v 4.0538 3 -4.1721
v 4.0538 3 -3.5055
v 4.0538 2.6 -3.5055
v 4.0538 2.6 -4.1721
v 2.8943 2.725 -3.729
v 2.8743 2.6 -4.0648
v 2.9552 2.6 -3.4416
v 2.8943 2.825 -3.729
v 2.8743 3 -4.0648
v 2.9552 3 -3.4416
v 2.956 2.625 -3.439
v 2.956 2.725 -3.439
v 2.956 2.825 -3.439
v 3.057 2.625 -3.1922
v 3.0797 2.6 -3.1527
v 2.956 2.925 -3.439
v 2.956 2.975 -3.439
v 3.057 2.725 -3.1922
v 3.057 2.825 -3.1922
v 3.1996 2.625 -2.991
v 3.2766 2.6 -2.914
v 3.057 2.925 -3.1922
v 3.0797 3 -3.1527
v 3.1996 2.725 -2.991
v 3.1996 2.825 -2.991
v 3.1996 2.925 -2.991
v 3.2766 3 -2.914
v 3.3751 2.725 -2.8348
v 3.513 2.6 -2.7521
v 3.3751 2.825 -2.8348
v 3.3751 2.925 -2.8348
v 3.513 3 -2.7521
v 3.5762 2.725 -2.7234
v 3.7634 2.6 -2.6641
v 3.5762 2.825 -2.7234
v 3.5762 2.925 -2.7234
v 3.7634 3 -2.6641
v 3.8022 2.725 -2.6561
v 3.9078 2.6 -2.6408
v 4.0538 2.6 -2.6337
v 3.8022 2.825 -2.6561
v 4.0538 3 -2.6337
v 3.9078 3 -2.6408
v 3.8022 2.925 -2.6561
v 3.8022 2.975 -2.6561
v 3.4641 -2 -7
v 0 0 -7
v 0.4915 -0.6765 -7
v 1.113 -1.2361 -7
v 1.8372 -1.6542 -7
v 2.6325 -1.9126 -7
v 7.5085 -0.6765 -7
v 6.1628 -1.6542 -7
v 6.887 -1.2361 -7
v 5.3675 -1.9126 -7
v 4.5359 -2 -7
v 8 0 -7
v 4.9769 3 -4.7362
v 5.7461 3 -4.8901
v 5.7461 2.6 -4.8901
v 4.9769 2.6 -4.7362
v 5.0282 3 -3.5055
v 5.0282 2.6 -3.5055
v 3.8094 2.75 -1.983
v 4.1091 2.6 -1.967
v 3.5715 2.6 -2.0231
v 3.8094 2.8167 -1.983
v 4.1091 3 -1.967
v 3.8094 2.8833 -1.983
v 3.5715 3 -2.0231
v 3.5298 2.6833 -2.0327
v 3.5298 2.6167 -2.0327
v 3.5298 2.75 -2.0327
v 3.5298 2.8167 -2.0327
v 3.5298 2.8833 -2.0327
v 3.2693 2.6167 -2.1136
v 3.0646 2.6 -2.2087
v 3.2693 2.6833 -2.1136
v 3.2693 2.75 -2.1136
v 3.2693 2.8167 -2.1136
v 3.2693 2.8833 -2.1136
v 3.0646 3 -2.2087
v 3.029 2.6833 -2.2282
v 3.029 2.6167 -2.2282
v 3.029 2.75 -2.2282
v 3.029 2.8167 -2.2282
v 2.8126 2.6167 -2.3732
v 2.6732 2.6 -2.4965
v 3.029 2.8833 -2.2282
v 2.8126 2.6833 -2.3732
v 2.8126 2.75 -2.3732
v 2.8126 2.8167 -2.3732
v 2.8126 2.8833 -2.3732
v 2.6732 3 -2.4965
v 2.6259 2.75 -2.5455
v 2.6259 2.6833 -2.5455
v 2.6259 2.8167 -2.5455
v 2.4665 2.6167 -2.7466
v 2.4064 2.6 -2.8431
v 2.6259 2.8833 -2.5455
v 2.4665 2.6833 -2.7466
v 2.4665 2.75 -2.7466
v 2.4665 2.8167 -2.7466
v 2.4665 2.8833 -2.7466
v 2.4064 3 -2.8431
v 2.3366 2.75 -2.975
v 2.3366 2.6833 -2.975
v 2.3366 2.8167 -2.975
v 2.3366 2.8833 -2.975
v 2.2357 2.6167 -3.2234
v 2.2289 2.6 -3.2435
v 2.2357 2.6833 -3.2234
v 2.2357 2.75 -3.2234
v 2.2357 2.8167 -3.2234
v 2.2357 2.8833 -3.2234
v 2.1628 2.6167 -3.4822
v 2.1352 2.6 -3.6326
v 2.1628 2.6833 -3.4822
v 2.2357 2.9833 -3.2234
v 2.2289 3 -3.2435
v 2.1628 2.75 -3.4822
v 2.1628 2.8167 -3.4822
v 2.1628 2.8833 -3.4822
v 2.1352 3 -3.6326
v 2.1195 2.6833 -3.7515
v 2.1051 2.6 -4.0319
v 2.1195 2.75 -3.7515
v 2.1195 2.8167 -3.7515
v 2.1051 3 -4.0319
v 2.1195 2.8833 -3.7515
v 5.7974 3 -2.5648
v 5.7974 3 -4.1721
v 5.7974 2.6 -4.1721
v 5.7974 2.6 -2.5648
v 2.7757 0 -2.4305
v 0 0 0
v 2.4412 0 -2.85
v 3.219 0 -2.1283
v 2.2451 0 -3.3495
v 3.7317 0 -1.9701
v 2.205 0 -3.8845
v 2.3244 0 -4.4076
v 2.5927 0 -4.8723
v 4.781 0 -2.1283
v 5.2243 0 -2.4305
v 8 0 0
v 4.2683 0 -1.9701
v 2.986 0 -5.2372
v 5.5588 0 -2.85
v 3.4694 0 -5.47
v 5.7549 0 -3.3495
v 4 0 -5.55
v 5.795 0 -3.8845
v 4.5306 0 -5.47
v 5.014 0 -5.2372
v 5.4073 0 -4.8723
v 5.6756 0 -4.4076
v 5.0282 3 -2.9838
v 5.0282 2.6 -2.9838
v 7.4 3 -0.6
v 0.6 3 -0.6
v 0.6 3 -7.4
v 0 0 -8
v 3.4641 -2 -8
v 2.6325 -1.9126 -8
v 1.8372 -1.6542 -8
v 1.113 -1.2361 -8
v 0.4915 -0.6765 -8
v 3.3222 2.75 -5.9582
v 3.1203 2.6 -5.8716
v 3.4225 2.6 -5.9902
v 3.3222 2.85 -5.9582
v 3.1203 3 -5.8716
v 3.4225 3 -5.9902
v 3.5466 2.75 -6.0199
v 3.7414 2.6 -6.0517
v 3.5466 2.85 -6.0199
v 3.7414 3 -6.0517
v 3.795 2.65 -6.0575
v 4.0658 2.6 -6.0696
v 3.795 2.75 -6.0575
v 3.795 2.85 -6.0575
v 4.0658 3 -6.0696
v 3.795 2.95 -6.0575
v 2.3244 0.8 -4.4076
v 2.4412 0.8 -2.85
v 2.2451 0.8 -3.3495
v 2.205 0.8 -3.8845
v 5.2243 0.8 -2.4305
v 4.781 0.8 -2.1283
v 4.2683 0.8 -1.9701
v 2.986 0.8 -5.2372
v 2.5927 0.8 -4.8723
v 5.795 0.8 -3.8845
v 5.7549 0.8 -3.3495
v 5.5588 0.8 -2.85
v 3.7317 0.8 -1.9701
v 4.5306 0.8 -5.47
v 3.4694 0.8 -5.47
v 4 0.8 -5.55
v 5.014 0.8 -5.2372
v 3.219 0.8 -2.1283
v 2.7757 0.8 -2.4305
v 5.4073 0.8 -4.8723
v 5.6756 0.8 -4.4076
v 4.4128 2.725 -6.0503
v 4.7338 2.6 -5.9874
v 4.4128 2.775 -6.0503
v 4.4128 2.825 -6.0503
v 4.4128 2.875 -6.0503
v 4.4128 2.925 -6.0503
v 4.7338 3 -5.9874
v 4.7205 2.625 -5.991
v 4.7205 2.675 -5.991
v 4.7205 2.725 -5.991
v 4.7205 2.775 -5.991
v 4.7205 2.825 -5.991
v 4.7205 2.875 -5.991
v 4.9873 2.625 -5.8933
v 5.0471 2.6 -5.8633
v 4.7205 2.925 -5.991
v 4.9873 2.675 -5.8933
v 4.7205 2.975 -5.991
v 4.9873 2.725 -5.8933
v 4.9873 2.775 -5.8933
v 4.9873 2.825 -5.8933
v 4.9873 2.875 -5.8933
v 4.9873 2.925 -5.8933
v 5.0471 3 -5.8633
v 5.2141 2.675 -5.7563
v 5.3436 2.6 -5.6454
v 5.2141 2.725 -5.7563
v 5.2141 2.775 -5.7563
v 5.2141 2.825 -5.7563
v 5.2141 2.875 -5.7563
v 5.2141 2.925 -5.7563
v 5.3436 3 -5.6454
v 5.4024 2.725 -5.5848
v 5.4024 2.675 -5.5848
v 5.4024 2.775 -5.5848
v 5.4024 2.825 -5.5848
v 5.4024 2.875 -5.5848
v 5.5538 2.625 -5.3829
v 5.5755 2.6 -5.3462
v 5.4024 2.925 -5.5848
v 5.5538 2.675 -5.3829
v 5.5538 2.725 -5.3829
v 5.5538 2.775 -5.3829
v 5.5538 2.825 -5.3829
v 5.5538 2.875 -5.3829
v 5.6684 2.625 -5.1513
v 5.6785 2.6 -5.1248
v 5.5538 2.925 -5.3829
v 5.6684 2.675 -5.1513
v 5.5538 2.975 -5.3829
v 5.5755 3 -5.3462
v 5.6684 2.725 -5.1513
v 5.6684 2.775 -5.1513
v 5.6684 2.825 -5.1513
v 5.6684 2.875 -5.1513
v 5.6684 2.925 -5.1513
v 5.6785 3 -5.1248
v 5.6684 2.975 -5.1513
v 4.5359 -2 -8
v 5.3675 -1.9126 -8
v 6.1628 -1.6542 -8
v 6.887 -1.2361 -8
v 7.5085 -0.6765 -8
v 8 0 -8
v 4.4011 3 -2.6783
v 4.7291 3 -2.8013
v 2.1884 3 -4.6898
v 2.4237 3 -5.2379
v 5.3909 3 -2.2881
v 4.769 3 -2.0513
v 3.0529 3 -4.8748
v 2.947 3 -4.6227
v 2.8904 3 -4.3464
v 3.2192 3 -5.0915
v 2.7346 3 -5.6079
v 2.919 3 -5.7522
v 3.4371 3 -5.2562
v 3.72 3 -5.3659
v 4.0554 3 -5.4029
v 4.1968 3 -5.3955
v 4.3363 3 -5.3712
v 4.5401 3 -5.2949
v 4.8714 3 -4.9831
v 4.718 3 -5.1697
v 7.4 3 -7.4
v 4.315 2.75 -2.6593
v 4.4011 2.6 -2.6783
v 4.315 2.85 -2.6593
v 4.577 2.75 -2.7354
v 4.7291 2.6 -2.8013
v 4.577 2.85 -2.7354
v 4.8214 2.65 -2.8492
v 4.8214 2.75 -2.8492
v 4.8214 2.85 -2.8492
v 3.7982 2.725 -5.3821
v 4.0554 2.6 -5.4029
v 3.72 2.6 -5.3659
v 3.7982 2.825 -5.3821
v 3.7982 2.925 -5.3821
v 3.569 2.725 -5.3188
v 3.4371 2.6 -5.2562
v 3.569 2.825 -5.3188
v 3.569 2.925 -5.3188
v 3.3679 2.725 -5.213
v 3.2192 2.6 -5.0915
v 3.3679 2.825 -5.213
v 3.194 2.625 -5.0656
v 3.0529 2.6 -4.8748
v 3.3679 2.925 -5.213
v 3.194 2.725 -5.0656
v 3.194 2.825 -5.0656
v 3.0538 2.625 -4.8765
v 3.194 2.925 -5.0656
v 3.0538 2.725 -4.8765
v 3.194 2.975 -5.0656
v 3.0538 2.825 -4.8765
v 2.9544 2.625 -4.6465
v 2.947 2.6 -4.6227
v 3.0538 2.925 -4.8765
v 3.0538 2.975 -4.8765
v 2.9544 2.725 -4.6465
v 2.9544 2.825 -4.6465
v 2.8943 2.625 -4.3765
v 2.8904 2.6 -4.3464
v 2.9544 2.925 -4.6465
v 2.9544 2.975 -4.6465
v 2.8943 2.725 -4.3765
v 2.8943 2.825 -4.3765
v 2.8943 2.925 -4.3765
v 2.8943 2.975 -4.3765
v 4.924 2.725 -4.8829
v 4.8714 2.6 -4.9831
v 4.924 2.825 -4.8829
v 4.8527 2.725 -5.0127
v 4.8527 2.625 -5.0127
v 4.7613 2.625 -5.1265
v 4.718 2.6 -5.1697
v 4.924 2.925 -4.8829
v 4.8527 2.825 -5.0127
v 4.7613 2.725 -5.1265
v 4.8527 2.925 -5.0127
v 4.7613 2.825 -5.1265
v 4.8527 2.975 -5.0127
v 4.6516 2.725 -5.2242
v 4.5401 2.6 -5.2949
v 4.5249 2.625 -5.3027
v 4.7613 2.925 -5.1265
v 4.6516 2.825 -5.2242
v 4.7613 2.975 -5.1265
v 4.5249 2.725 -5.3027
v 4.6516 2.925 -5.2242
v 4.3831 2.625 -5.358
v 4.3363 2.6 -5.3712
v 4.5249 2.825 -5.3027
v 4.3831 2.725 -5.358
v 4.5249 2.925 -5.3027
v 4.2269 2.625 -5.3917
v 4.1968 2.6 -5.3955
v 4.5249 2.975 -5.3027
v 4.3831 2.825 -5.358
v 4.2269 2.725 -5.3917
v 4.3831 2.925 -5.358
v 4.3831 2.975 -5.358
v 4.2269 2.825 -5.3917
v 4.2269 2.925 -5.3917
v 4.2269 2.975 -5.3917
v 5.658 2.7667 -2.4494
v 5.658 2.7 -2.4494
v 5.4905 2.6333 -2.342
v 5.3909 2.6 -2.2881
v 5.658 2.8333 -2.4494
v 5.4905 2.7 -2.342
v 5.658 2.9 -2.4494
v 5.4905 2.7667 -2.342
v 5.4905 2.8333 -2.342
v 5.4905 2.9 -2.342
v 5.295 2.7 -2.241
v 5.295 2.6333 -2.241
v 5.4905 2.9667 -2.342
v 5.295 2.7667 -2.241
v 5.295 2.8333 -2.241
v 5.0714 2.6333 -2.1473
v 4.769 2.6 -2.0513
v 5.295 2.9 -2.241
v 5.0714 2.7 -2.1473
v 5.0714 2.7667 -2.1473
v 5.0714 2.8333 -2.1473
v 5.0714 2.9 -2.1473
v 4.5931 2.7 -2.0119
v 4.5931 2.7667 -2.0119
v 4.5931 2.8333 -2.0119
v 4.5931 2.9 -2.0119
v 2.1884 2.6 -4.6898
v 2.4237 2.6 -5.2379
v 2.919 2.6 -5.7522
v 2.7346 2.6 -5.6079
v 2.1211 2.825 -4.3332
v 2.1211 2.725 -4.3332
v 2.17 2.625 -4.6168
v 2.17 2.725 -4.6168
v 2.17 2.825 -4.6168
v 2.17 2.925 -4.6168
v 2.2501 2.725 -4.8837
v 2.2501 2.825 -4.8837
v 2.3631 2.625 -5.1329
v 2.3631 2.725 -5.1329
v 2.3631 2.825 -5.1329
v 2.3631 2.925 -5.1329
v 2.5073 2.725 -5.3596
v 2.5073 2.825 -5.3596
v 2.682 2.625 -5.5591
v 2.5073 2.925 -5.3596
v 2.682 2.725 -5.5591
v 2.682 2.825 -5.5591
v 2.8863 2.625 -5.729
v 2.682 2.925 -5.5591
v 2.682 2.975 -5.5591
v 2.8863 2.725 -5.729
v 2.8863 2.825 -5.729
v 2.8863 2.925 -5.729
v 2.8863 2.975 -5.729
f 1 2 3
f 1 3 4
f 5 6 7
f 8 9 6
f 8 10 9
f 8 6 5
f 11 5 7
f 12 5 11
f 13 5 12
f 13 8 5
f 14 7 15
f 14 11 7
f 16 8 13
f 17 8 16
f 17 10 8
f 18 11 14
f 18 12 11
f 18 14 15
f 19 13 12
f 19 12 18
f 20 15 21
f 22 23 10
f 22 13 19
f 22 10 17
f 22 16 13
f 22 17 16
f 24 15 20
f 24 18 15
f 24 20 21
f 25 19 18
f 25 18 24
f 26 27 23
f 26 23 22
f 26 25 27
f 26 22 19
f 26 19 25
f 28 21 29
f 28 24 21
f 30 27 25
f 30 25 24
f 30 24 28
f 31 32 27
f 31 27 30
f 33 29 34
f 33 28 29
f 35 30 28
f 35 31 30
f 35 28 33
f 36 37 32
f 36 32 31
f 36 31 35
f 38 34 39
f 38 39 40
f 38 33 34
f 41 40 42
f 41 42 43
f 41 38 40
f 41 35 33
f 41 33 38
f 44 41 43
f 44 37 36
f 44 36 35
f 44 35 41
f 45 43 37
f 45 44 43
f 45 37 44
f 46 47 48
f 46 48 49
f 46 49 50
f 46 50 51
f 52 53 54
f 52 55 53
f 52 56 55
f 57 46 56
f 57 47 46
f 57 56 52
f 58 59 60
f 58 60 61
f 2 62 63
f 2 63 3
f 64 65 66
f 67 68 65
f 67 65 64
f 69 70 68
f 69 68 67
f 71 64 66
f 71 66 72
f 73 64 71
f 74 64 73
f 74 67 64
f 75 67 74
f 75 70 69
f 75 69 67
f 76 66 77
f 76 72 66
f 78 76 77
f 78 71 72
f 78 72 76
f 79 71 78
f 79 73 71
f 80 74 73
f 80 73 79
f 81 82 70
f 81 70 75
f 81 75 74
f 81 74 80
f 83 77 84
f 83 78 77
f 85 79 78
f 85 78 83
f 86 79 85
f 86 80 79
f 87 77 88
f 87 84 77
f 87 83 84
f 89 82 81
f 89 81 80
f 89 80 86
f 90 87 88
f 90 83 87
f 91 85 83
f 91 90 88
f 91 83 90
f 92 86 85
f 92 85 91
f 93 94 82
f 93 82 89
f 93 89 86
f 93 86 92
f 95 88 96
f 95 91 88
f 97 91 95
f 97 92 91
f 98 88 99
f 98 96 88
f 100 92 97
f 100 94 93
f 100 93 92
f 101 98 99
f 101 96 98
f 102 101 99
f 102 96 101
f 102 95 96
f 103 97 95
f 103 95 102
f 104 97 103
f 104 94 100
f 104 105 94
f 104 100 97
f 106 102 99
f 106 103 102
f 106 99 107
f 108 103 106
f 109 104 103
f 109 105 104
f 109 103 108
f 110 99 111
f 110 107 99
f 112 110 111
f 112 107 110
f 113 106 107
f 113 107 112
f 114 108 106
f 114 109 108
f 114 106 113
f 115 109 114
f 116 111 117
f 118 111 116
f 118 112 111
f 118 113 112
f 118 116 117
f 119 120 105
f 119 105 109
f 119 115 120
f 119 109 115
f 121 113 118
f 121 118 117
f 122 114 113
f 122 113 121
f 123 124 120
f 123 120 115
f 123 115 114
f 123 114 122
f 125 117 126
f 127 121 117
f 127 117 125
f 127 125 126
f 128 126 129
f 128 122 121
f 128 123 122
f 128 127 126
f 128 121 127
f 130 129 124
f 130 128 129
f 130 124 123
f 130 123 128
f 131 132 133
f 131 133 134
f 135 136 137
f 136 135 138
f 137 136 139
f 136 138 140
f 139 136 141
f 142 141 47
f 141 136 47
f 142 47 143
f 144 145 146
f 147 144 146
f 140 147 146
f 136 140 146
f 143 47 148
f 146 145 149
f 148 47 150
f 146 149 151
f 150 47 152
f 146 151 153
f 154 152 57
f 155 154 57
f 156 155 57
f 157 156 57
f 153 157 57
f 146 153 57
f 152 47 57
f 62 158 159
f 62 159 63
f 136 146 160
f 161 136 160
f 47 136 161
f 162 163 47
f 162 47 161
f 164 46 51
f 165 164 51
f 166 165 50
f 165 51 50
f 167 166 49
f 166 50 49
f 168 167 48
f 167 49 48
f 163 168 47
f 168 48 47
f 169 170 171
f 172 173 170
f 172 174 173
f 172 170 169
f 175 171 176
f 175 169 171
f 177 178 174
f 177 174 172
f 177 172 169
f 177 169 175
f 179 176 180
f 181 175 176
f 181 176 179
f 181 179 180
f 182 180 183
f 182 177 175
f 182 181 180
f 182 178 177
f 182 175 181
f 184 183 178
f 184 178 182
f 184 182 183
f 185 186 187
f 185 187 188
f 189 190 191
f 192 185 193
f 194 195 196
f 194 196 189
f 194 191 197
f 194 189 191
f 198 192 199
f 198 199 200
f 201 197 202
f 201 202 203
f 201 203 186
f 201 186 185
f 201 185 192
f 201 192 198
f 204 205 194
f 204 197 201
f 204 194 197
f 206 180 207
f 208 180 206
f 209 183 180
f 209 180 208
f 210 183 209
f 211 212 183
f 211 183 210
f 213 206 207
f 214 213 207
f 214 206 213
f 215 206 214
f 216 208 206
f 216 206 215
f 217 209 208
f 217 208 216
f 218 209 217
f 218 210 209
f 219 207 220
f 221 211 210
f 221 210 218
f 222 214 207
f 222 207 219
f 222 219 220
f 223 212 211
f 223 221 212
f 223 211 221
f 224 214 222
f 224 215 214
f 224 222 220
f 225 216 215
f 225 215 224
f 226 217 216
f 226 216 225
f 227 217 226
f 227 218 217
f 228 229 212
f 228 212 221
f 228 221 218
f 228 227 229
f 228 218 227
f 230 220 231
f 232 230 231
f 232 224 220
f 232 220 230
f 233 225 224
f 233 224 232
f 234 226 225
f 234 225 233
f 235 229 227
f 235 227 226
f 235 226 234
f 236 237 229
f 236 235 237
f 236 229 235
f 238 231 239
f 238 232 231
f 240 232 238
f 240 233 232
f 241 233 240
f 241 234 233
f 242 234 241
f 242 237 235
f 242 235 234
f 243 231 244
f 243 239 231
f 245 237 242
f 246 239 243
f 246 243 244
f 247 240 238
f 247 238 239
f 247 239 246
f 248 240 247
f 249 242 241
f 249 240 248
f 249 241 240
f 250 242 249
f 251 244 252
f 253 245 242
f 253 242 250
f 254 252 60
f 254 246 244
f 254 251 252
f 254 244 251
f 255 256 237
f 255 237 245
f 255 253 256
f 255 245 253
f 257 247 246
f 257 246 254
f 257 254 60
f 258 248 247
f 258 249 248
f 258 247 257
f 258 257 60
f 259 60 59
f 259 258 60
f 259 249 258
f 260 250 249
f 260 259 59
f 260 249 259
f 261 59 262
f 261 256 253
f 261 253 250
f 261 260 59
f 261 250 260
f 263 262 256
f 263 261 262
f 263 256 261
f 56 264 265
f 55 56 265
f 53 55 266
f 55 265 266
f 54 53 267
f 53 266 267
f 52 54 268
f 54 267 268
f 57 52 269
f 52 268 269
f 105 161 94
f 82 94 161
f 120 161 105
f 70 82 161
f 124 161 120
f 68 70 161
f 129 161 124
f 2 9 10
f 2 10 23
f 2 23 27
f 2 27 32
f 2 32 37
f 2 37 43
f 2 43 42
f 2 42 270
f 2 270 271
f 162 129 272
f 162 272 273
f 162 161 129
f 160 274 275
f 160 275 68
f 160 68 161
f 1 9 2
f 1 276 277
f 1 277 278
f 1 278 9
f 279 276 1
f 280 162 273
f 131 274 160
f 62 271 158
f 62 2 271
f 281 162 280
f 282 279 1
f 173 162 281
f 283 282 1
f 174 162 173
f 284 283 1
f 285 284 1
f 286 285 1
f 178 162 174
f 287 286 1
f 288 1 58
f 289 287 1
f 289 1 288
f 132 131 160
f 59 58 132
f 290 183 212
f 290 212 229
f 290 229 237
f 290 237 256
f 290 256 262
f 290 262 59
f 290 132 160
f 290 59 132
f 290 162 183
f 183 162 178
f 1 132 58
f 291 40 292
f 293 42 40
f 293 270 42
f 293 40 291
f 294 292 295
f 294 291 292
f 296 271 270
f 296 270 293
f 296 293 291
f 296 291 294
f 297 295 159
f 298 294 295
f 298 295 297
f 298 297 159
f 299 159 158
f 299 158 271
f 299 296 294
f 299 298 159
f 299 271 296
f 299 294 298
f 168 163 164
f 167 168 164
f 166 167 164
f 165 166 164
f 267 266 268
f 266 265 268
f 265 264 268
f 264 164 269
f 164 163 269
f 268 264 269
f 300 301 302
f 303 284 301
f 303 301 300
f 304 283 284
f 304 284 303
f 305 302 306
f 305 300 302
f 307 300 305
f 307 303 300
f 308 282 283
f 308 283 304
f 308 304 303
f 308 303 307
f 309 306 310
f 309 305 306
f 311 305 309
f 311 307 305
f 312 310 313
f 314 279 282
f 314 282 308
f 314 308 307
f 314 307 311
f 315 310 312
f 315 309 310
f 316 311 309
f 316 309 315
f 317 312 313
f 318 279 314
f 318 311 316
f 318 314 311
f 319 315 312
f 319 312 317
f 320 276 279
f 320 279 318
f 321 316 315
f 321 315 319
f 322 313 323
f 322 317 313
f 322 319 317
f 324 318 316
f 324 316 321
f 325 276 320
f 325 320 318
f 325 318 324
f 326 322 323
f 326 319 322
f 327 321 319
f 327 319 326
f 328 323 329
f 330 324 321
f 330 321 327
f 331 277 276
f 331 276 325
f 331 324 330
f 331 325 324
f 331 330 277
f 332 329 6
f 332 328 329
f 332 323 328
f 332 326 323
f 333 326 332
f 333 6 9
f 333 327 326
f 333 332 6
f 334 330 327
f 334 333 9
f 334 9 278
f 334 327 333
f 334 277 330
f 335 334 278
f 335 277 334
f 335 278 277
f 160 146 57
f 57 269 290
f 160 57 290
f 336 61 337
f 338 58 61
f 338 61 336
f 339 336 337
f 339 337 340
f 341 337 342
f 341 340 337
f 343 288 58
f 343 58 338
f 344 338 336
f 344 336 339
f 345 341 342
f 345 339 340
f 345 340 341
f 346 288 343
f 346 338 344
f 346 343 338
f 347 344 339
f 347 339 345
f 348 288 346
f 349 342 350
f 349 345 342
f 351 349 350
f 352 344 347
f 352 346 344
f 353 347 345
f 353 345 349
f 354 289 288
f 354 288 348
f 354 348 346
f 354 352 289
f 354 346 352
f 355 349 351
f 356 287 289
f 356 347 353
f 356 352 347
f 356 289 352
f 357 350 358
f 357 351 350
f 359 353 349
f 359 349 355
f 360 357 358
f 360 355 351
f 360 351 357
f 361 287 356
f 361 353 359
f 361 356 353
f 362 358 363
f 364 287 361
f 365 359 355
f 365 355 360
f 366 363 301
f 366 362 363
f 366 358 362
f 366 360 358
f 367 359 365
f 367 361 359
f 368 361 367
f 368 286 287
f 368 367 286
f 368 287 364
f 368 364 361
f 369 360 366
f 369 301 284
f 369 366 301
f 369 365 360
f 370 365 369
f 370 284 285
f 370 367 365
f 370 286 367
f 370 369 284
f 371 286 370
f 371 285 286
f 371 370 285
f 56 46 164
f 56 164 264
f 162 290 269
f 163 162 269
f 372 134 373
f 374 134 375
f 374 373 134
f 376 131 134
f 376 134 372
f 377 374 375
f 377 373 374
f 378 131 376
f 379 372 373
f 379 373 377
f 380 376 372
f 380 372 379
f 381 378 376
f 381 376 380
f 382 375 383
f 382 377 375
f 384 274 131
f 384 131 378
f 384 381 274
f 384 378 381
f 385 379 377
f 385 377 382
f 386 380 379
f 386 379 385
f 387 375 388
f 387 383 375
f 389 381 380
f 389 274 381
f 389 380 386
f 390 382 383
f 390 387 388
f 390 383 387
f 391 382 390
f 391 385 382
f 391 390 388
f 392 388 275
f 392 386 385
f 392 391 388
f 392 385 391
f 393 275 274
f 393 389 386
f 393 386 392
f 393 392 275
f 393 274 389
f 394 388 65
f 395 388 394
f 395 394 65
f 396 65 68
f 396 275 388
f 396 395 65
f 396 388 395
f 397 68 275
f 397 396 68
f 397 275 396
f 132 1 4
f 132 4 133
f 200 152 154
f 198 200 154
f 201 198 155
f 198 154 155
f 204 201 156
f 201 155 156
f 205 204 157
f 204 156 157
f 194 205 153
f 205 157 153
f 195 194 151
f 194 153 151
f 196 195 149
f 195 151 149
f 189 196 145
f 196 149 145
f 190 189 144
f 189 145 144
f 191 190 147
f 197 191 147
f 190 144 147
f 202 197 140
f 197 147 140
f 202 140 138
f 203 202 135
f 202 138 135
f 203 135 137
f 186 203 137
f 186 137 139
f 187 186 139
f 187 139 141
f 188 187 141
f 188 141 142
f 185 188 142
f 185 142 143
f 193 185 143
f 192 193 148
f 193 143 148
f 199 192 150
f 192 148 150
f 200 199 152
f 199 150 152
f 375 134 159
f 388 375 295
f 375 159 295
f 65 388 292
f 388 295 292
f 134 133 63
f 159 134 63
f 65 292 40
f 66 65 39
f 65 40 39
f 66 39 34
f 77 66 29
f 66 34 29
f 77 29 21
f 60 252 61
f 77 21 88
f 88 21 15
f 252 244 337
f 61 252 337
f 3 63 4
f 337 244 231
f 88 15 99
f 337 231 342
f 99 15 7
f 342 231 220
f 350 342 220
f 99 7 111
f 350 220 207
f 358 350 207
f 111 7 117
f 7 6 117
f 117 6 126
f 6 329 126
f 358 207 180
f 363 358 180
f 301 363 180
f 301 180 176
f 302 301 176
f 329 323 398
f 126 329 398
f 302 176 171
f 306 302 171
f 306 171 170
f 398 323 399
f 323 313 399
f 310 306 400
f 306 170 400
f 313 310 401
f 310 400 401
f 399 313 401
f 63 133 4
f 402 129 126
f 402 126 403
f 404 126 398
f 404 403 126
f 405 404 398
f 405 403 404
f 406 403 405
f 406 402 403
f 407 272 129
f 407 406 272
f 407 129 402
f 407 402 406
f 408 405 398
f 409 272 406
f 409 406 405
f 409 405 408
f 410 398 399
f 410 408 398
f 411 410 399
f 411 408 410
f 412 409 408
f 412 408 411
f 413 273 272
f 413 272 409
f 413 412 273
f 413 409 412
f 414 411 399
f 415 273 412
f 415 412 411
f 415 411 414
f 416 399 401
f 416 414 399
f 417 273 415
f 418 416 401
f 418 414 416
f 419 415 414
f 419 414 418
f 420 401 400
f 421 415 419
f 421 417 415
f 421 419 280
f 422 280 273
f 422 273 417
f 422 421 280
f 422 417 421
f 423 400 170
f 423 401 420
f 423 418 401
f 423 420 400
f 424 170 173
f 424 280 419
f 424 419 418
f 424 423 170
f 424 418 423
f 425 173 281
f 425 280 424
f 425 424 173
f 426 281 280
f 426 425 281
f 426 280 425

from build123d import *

# Parameters (mm, degrees)
SKETCH1_W               = 8
SKETCH1_H               = 8
BOSS_EXTRUDE1_DEPTH     = 3
CUT_EXTRUDE1_DEPTH      = 12.704699911
CUT_EXTRUDE1_DEPTH_BACK = 12.704699911
CUT_EXTRUDE2_DEPTH      = 11
SKETCH4_R               = 1.8
CUT_EXTRUDE3_DEPTH      = 0.8
SKETCH5_W               = 8
SKETCH5_H               = 1
BOSS_EXTRUDE2_DEPTH     = 2
FILLET1_R               = 4
CUT_EXTRUDE4_DEPTH      = 0.4


with BuildPart() as part:
    # Sketch1 → Boss-Extrude1 (new body)
    with BuildSketch(Plane(origin=(0, 0, 0), x_dir=(1, 0, 0), z_dir=(0, 1, 0))):
        with Locations((4, 4)):
            Rectangle(SKETCH1_W, SKETCH1_H)
    extrude(amount=BOSS_EXTRUDE1_DEPTH)

    # Sketch2 → Cut-Extrude1 (cut, two sides: drawn at the far end of the back side and taken through both)
    with BuildSketch(Plane.XY.offset(-CUT_EXTRUDE1_DEPTH_BACK)):
        Polygon((0, 0), (0.6, 3), (0, 3), align=None)
        Polygon((8, 0), (7.4, 3), (8, 3), align=None)
    extrude(amount=CUT_EXTRUDE1_DEPTH + CUT_EXTRUDE1_DEPTH_BACK, mode=Mode.SUBTRACT)

    # Sketch3 → Cut-Extrude2 (cut)
    with BuildSketch(Plane(origin=(0, 0, 0), x_dir=(0, 0, -1), z_dir=(1, 0, 0))):
        Polygon((0, 0), (0.6, 3), (0, 3), align=None)
        Polygon((8, 3), (7.4, 3), (8, 0), align=None)
    extrude(amount=CUT_EXTRUDE2_DEPTH, mode=Mode.SUBTRACT)

    # Sketch4 → Cut-Extrude3 (cut)
    with BuildSketch(Plane.XZ):
        with Locations(Location((4, -3.75, 0), (0, 0, 270))):
            Circle(SKETCH4_R)
    extrude(amount=-CUT_EXTRUDE3_DEPTH, mode=Mode.SUBTRACT)

    # Sketch5 → Boss-Extrude2 (add)
    with BuildSketch(Plane.XZ):
        with Locations((4, -7.5)):
            Rectangle(SKETCH5_W, SKETCH5_H)
    extrude(amount=BOSS_EXTRUDE2_DEPTH)

    # Fillet1
    # the kernel refuses this fillet: 4 mm, written as the material it takes off along each edge
    with BuildSketch(Plane(origin=(8, -2, -16.660254038), x_dir=(0, 1, 0), z_dir=(0, 0, 1)), Plane(origin=(0, -2, 1.660254038), x_dir=(0, 1, 0), z_dir=(0, 0, -1))) as fillet1_piece_1:
        with BuildLine():
            CenterArc((4, 3.464101615), FILLET1_R, 180, 60)
            Line((0, 3.464101615), (-0.08, 3.464101615))
            Line((-0.08, 3.464101615), (-0.08, 0))
            Line((-0.08, 0), (0, -0.08))
            ThreePointArc((0, -0.08), (1, -0.08), (1.96, -0.069282032))
            Line((1.96, -0.069282032), (2, 0))
        make_face()
    extrude(amount=18.320508076, mode=Mode.SUBTRACT)

    # Sketch6 → Cut-Extrude4 (cut)
    with BuildSketch(Plane(origin=(0, 3, 0), x_dir=(1, 0, 0), z_dir=(0, 1, 0))):
        with BuildLine():
            Line((4.053794593, 3.505457585), (4.053794593, 4.172124252))
            Line((4.053794593, 4.172124252), (5.797384337, 4.172124252))
            Line((5.797384337, 4.172124252), (5.797384337, 2.564752457))
            add(Edge.make_bspline(
                [(5.797384337, 2.564752457), (5.775440275, 2.544992361), (5.730582172, 2.504598726), (5.657391115, 2.447633596), (5.576814656, 2.393249062), (5.489339896, 2.340343698), (5.394785806, 2.289343315), (5.293529517, 2.239537607), (5.185384208, 2.19141366), (5.032450931, 2.131128575), (4.835594452, 2.065533422), (4.594933471, 2.008496304), (4.352368706, 1.973513189), (4.190125473, 1.969167013), (4.109083055, 1.966996047)],
                knots=[0, 0, 0, 0, 0.581799769, 1.189316438, 1.825828404, 2.496525428, 3.203088405, 3.942228803, 4.719818701, 5.534979611, 7.181138583, 8.803804008, 10.403462225, 12, 12, 12, 12], degree=3))
            add(Edge.make_bspline(
                [(4.109083055, 1.966996047), (4.058312627, 1.967758979), (3.958229013, 1.969262944), (3.810482794, 1.981368296), (3.667847904, 2.002080495), (3.530208107, 2.031409962), (3.397097502, 2.066765974), (3.26907094, 2.111868039), (3.146582956, 2.166009466), (3.028523806, 2.226338905), (2.917094396, 2.295632176), (2.812187083, 2.371432832), (2.714561168, 2.454400196), (2.624566637, 2.544701507), (2.540998329, 2.641714843), (2.464831298, 2.745902822), (2.396526155, 2.857385727), (2.335239765, 2.974765127), (2.280716867, 3.097008702), (2.234709094, 3.223154334), (2.194374003, 3.351370526), (2.161222966, 3.482107416), (2.136875151, 3.615790052), (2.117947657, 3.751799892), (2.107781758, 3.890986734), (2.105984472, 3.984609884), (2.105076645, 4.031899893)],
                knots=[0, 0, 0, 0, 1.124918047, 2.217548049, 3.282233239, 4.316494221, 5.334437038, 6.332151046, 7.320712088, 8.300141923, 9.267552434, 10.225301062, 11.165776911, 12.103230934, 13.047553934, 14.000517593, 14.959782875, 15.941944936, 16.932894943, 17.923491392, 18.915624898, 19.910402922, 20.909870877, 21.92519501, 22.95199481, 24, 24, 24, 24], degree=3))
            add(Edge.make_bspline(
                [(2.105076645, 4.031899893), (2.105812881, 4.082940857), (2.107264322, 4.183564655), (2.119773705, 4.33228546), (2.139199297, 4.476648194), (2.168656936, 4.616390773), (2.20449512, 4.75216369), (2.248233589, 4.883877531), (2.301822866, 5.010556427), (2.361436063, 5.133283761), (2.429297714, 5.250362339), (2.505977563, 5.360290437), (2.589206445, 5.464176802), (2.680629029, 5.560371285), (2.779923369, 5.648827012), (2.886080088, 5.730522243), (2.998844963, 5.806865303), (3.079553832, 5.849911113), (3.120301004, 5.871643482)],
                knots=[0, 0, 0, 0, 1.105010302, 2.178452875, 3.229459892, 4.257086284, 5.268538906, 6.268935615, 7.259234261, 8.24469117, 9.221745683, 10.185929258, 11.144249683, 12.101504986, 13.055838221, 14.020611351, 15.000673771, 16, 16, 16, 16], degree=3))
            add(Edge.make_bspline(
                [(3.120301004, 5.871643482), (3.152638085, 5.887700047), (3.218317351, 5.920312247), (3.322813337, 5.959248923), (3.432101667, 5.994677516), (3.547832356, 6.021111591), (3.6692195, 6.042829226), (3.796209305, 6.059036287), (3.929210312, 6.067547239), (4.019595582, 6.068879104), (4.065813824, 6.069560149)],
                knots=[0, 0, 0, 0, 0.887969848, 1.803539625, 2.741143579, 3.713741423, 4.722068772, 5.775476617, 6.8624965, 8, 8, 8, 8], degree=3))
            add(Edge.make_bspline(
                [(4.065813824, 6.069560149), (4.125403824, 6.06867255), (4.241295356, 6.066946335), (4.410256532, 6.05256252), (4.569271079, 6.027772487), (4.718560435, 5.993629866), (4.857802985, 5.949731518), (4.986759025, 5.895763799), (5.106220057, 5.832812796), (5.214455834, 5.758355608), (5.313666102, 5.676257846), (5.403591975, 5.586419647), (5.48426965, 5.488707943), (5.555752499, 5.383614392), (5.617477906, 5.2707046), (5.670549966, 5.151008328), (5.714234697, 5.023616882), (5.73534656, 4.935145779), (5.746102286, 4.89007297)],
                knots=[0, 0, 0, 0, 1.271135529, 2.472123572, 3.614091059, 4.701890498, 5.736279567, 6.724681829, 7.680621489, 8.611506429, 9.52200816, 10.424540711, 11.318996785, 12.221421405, 13.131851814, 14.060431888, 15.011860567, 16, 16, 16, 16], degree=3))
            Line((5.746102286, 4.89007297), (4.976871517, 4.736226816))
            add(Edge.make_bspline(
                [(4.976871517, 4.736226816), (4.969254672, 4.761468809), (4.95422678, 4.81127079), (4.925094227, 4.882758251), (4.891539922, 4.949961192), (4.853483379, 5.013366036), (4.810541206, 5.072582433), (4.761675926, 5.126971617), (4.709961453, 5.179014495), (4.652020351, 5.225088646), (4.590259767, 5.266624284), (4.52537561, 5.304078684), (4.455901775, 5.334453158), (4.382811411, 5.358892727), (4.306461756, 5.37964837), (4.225856415, 5.392413169), (4.141900573, 5.402040295), (4.084540473, 5.402606041), (4.055397158, 5.402893482)],
                knots=[0, 0, 0, 0, 1.027736275, 2.027704492, 3.005900071, 3.954421694, 4.908588141, 5.853155543, 6.803277083, 7.766271258, 8.734041521, 9.704274878, 10.683578894, 11.68490234, 12.708089448, 13.76461009, 14.864251086, 16, 16, 16, 16], degree=3))
            add(Edge.make_bspline(
                [(4.055397158, 5.402893482), (4.01128773, 5.401716629), (3.925204424, 5.399419898), (3.799534269, 5.384433236), (3.680976007, 5.357770589), (3.569219615, 5.320994553), (3.46406021, 5.273789934), (3.366918824, 5.2143961), (3.275376693, 5.146327474), (3.192038786, 5.066438045), (3.116460773, 4.976859168), (3.051034483, 4.876522357), (2.996567377, 4.765751945), (2.951955713, 4.645104141), (2.91643531, 4.514573915), (2.892338718, 4.373699188), (2.876594443, 4.222696077), (2.875085403, 4.118480819), (2.874307414, 4.064752457)],
                knots=[0, 0, 0, 0, 1.043810997, 2.037086103, 2.989314757, 3.91471467, 4.817033861, 5.710208705, 6.603920097, 7.511448416, 8.435617211, 9.371747005, 10.338444094, 11.350425613, 12.411431869, 13.5347293, 14.729025275, 16, 16, 16, 16], degree=3))
            add(Edge.make_bspline(
                [(2.874307414, 4.064752457), (2.875118698, 4.00702506), (2.876695474, 3.894828493), (2.892027057, 3.732262921), (2.917247643, 3.580803592), (2.95342224, 3.44064155), (2.998941149, 3.311279521), (3.053656914, 3.192304252), (3.121182779, 3.085923464), (3.197244894, 2.990004781), (3.28225913, 2.906191636), (3.37384152, 2.833121051), (3.471482188, 2.77119638), (3.576081527, 2.721395085), (3.686320303, 2.681751972), (3.80321198, 2.653959398), (3.926408504, 2.636695674), (4.010734238, 2.634687946), (4.053794593, 2.633662713)],
                knots=[0, 0, 0, 0, 1.318042826, 2.561693173, 3.724929596, 4.821196409, 5.862977565, 6.853497791, 7.804600806, 8.73339865, 9.643480846, 10.524649628, 11.404635349, 12.277659519, 13.165160235, 14.075017549, 15.017020959, 16, 16, 16, 16], degree=3))
            add(Edge.make_bspline(
                [(4.053794593, 2.633662713), (4.097408334, 2.634875039), (4.185053042, 2.637311287), (4.316328539, 2.657956024), (4.448117665, 2.68833542), (4.577327471, 2.734163302), (4.70281192, 2.786727561), (4.819965055, 2.847306941), (4.929675356, 2.910453005), (4.995733738, 2.959668979), (5.028153568, 2.98382297)],
                knots=[0, 0, 0, 0, 0.993821502, 1.997150276, 3.023717651, 4.073291794, 5.118404464, 6.123376694, 7.078999408, 8, 8, 8, 8], degree=3))
            Line((5.028153568, 2.98382297), (5.028153568, 3.505457585))
            Line((5.028153568, 3.505457585), (4.053794593, 3.505457585))
        make_face()
    extrude(amount=-CUT_EXTRUDE4_DEPTH, mode=Mode.SUBTRACT)


solid = part.part
